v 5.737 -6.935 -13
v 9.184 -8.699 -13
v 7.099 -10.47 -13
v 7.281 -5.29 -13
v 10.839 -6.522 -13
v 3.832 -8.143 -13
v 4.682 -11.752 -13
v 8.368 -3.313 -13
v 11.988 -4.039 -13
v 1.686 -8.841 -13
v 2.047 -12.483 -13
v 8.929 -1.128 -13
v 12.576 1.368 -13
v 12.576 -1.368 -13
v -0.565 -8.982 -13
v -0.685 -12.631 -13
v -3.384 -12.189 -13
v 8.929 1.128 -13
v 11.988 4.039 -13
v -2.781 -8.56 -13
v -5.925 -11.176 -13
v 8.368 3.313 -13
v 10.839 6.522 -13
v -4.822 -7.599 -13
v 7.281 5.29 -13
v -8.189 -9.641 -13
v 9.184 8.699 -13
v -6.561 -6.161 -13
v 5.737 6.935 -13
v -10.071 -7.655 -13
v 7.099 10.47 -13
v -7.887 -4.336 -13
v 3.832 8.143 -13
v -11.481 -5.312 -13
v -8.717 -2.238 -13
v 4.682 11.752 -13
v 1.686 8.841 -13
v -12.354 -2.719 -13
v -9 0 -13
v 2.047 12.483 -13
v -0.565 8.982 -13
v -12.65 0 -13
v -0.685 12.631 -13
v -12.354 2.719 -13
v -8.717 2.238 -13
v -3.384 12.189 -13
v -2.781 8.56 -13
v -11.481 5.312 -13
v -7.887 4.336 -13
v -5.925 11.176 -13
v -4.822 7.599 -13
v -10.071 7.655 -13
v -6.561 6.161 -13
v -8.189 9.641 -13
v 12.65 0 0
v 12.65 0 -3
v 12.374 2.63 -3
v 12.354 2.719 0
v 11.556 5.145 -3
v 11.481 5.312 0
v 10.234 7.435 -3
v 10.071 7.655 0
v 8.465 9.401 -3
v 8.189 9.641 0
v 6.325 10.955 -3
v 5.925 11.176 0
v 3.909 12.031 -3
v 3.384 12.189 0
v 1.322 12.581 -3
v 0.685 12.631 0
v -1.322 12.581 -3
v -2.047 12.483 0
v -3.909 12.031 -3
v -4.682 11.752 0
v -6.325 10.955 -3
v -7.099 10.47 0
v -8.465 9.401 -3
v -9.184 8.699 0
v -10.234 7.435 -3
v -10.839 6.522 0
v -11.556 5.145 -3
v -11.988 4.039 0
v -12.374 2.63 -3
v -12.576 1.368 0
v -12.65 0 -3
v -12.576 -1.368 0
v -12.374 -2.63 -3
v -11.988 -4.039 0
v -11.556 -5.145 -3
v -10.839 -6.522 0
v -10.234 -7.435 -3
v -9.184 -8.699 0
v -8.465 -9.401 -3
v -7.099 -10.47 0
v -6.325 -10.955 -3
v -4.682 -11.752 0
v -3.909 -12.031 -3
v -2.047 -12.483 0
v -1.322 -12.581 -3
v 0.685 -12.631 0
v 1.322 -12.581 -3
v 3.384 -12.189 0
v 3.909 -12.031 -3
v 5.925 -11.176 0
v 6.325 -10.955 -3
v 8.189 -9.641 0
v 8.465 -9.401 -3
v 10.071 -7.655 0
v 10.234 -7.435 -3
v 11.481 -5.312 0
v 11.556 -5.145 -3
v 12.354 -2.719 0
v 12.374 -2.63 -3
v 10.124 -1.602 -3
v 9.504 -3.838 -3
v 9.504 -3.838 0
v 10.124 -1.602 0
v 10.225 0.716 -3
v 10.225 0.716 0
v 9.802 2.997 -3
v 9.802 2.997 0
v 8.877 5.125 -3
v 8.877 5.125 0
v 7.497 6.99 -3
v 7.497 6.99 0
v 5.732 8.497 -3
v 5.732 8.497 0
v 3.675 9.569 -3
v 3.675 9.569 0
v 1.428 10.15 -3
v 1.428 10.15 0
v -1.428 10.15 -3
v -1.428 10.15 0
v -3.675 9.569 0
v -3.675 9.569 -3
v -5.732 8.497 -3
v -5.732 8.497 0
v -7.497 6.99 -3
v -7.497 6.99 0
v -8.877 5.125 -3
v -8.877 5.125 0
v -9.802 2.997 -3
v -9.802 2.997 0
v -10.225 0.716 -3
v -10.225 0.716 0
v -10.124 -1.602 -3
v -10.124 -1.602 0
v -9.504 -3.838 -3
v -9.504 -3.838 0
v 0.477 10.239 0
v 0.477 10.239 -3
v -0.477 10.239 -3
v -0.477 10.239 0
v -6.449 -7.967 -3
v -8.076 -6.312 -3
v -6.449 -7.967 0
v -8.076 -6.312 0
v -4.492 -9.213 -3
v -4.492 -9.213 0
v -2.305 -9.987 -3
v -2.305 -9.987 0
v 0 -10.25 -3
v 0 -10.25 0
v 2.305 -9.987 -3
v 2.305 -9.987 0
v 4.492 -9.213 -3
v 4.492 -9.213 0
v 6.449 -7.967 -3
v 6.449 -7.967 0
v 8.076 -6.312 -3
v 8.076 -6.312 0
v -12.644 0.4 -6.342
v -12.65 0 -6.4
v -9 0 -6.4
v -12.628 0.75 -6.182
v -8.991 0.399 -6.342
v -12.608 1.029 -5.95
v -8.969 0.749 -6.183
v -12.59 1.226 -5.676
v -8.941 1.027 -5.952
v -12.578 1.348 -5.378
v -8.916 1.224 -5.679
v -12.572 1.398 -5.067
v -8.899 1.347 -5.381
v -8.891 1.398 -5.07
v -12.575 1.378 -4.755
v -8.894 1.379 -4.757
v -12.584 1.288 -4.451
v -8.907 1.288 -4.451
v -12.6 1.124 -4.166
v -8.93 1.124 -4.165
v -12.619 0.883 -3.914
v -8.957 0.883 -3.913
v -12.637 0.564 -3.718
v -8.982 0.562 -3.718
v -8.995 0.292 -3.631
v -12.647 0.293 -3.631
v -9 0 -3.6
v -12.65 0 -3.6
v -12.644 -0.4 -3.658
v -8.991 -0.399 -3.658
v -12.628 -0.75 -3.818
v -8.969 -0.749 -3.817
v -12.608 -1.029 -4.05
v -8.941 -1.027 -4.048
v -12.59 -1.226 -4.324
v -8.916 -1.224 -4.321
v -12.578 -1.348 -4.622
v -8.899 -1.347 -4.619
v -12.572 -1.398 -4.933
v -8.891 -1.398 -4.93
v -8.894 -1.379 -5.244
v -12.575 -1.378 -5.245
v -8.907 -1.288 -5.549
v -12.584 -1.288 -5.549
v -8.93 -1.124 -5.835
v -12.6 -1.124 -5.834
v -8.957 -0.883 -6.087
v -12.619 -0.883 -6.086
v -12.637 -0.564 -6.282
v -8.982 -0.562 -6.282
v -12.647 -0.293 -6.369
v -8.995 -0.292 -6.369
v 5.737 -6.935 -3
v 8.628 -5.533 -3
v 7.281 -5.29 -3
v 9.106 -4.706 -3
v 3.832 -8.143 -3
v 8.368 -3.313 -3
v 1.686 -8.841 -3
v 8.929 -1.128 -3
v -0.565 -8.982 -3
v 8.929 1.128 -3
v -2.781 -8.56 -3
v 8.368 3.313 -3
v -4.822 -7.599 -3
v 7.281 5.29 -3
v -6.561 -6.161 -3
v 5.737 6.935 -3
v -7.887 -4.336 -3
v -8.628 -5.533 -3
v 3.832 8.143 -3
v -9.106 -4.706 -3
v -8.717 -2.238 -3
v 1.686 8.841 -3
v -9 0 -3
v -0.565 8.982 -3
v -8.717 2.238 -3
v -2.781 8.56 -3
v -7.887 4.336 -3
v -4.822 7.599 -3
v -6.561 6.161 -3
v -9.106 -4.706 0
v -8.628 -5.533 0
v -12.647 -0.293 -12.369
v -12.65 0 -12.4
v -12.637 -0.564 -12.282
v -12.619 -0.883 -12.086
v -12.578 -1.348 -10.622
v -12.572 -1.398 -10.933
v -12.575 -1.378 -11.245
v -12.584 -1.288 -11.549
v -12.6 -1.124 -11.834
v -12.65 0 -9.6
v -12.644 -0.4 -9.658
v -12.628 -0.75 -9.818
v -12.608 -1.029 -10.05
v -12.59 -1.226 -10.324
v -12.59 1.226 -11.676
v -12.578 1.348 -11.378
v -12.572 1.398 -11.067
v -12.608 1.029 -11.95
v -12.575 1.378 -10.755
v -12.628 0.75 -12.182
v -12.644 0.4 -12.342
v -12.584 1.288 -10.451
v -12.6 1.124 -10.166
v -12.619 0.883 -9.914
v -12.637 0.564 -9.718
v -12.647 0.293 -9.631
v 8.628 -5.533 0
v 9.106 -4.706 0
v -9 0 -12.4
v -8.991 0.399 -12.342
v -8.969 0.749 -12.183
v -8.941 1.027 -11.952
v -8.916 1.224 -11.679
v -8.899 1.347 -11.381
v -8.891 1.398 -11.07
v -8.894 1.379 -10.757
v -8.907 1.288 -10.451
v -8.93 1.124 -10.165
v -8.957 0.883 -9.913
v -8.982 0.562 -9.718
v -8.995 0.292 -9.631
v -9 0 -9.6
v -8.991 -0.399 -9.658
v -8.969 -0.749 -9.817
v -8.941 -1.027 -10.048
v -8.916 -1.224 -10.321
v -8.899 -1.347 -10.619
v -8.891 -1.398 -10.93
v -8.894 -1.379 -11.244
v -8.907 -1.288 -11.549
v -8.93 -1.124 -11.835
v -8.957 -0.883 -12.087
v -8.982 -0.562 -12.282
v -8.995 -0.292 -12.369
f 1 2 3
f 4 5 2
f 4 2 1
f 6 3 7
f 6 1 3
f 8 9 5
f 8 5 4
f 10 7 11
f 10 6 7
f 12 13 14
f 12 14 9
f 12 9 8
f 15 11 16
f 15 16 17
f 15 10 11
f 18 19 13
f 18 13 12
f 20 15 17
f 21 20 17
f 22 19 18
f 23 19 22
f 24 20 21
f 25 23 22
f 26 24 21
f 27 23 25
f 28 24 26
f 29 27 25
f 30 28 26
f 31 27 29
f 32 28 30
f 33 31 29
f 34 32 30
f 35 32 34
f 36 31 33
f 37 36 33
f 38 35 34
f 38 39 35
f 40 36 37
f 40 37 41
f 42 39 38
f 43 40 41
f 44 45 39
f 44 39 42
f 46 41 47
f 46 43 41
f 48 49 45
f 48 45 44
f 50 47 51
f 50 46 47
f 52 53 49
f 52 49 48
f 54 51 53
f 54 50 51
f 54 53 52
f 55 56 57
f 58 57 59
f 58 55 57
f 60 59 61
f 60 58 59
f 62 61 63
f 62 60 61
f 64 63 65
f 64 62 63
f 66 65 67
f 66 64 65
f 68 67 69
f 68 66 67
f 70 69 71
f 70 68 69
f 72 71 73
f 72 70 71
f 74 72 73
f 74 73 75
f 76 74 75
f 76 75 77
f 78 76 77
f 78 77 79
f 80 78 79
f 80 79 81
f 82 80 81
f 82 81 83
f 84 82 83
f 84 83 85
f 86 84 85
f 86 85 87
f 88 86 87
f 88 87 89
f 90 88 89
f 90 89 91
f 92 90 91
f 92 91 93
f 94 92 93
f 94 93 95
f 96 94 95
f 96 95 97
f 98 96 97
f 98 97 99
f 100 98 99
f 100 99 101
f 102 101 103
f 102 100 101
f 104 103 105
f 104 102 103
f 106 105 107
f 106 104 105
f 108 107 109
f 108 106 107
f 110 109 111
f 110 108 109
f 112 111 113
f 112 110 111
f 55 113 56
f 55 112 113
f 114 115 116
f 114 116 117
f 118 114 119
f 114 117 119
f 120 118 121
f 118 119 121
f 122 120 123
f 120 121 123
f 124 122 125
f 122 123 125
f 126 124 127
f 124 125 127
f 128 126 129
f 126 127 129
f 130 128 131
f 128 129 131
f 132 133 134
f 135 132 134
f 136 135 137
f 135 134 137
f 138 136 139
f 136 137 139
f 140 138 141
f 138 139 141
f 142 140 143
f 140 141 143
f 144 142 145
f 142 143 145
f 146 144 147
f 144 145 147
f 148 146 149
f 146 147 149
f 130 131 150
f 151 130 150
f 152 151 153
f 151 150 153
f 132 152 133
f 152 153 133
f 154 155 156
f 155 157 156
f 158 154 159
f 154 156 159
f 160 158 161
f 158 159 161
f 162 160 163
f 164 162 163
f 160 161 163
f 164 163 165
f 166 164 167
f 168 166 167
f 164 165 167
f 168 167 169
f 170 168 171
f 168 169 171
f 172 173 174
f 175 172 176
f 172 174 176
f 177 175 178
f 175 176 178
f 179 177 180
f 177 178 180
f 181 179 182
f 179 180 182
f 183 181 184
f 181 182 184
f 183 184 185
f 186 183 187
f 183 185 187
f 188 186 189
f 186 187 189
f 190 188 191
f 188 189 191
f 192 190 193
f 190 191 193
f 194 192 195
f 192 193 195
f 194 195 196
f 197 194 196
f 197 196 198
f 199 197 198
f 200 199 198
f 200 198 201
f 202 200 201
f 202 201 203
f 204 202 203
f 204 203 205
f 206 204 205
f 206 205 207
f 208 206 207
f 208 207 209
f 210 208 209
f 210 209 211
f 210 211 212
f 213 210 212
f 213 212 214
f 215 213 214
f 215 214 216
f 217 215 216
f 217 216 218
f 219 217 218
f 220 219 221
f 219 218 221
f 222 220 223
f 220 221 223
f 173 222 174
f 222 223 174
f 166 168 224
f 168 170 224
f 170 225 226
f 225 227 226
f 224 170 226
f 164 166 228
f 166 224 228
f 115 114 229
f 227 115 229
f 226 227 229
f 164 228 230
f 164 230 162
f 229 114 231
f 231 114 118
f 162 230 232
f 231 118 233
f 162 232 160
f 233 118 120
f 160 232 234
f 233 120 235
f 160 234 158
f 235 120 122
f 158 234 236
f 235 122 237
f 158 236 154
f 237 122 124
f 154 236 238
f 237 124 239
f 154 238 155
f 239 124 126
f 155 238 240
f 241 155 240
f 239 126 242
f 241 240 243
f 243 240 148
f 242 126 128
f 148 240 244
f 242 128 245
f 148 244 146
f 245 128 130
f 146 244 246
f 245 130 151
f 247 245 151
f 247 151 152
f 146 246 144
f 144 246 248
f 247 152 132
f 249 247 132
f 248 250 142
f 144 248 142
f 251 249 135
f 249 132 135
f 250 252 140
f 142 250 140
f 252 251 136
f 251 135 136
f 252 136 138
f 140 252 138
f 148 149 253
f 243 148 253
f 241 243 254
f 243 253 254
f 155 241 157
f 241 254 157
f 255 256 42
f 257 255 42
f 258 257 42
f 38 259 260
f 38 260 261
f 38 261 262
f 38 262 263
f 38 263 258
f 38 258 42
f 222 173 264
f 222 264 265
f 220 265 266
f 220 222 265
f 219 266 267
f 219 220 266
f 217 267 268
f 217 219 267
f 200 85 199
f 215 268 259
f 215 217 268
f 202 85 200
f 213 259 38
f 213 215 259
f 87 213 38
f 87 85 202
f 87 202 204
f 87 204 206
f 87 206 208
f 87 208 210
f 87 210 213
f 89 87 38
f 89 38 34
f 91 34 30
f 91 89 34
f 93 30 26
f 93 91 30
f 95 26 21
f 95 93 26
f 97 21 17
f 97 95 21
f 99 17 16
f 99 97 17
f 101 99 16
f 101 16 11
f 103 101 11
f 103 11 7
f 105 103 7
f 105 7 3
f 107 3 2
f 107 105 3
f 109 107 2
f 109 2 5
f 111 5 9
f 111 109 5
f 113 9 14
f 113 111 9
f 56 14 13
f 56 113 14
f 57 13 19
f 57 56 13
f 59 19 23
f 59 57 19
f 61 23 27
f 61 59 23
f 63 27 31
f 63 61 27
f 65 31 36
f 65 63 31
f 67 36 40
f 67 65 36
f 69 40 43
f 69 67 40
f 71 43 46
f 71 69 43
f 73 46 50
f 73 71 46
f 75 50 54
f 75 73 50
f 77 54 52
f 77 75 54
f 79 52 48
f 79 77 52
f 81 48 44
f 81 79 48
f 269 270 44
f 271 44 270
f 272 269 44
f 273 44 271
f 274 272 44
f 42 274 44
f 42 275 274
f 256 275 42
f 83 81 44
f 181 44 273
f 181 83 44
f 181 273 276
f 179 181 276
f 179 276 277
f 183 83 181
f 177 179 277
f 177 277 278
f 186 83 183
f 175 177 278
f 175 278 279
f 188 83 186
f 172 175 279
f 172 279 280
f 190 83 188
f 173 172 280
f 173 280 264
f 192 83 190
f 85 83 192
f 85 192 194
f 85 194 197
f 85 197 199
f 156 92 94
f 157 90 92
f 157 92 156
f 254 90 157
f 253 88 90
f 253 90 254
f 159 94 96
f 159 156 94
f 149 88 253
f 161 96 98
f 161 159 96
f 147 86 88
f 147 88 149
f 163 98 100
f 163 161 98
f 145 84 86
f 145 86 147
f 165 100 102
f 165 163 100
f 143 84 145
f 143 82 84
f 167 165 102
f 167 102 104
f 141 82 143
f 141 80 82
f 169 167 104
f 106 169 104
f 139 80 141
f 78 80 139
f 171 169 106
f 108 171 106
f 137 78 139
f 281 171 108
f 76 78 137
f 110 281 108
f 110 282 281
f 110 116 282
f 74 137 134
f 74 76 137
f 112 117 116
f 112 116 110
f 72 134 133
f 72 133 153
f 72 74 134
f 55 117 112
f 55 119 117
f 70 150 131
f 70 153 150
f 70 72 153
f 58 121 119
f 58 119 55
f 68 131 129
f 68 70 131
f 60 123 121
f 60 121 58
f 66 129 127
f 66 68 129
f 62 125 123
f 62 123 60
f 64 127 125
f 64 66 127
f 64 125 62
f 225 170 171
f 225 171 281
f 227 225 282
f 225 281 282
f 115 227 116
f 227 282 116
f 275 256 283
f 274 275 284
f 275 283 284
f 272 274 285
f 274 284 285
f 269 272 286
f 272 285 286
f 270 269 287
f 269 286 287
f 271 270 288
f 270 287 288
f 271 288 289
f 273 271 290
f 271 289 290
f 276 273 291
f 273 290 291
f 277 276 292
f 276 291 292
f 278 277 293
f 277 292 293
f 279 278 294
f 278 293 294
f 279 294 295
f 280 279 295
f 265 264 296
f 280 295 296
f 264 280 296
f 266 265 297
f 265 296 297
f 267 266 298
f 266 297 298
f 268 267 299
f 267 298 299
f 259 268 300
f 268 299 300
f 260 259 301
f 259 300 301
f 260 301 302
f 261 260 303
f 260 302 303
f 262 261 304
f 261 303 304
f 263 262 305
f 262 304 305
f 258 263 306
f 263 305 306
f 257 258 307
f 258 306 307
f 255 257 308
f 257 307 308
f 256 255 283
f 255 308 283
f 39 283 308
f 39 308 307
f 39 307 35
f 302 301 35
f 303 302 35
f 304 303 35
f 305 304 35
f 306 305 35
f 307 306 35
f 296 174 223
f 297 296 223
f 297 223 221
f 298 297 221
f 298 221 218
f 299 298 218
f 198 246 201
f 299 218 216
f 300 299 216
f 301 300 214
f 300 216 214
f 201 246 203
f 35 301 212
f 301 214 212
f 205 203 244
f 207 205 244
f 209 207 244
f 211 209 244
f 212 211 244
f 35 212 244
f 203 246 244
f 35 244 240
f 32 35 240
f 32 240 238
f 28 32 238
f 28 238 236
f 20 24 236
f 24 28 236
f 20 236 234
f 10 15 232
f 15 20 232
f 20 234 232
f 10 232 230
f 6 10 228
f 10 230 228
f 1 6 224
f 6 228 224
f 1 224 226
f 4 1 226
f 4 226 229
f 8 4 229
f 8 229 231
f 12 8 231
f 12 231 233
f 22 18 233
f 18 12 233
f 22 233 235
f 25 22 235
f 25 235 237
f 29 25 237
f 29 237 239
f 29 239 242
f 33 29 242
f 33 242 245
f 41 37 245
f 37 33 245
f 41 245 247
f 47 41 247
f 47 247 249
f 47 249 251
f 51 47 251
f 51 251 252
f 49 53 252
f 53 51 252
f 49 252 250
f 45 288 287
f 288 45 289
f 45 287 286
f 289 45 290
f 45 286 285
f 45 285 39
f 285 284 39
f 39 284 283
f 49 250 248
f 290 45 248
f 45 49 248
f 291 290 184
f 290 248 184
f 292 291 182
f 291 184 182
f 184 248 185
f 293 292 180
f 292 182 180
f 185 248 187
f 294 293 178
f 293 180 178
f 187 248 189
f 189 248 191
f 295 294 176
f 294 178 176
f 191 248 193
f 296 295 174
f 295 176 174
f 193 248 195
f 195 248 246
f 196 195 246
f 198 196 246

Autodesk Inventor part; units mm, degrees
ref_plane "YZ Plane" through (0, 0, 0) normal (1, 0, 0) x (0, 1, 0)
ref_plane "XZ Plane" through (0, 0, 0) normal (0, 1, 0) x (-1, 0, 0)
ref_plane "XY Plane" through (0, 0, 0) normal (0, 0, 1) x (1, 0, 0)
sketch "Sketch1" plane through (0, 0, 0) normal (0, 0, 1) x (1, 0, 0)
  line L0 (9.6801, -14.008) -> (7.2052, -11.5331) construction
  line L1 (7.2052, -11.5331) -> (11.5893, -7.1491) construction
  line L2 (11.5893, -7.1491) -> (14.0642, -9.6239) construction
  line L3 (14.0642, -9.6239) -> (9.6801, -14.008) construction
  arc A0 (12.6369, -4.7496) -> (4.7496, -12.6369) centre (0, 0) ccw construction
  line L4 (10.9298, -3.0424) -> (12.6369, -4.7496) construction
  line L5 (11.6618, -4.6122) -> (10.9298, -3.0424) construction
  arc A1 (11.6618, -4.6122) -> (10.8551, -4.47) centre (11.2086, -4.8235) ccw construction
  line L6 (10.7915, -4.5335) -> (10.8551, -4.47) construction
  arc A2 (10.7915, -4.5335) -> (10.6527, -4.9738) centre (11.1451, -4.887) ccw construction
  line L7 (10.915, -6.4612) -> (10.6527, -4.9738) construction
  arc A3 (10.7761, -6.9016) -> (10.915, -6.4612) centre (10.4226, -6.548) ccw construction
  line L8 (6.9016, -10.7761) -> (10.7761, -6.9016) construction
  arc A4 (6.4612, -10.915) -> (6.9016, -10.7761) centre (6.548, -10.4226) ccw construction
  line L9 (6.4612, -10.915) -> (4.9738, -10.6527) construction
  arc A5 (4.9738, -10.6527) -> (4.5335, -10.7915) centre (4.887, -11.1451) ccw construction
  line L10 (4.5335, -10.7915) -> (4.47, -10.8551) construction
  arc A6 (4.47, -10.8551) -> (4.6122, -11.6618) centre (4.8235, -11.2086) ccw construction
  line L11 (4.6122, -11.6618) -> (3.0424, -10.9298) construction
  line L12 (3.0424, -10.9298) -> (4.7496, -12.6369) construction
  line L13 (-1.7167, -14.6498) -> (-1.7167, -17.5) construction
  line L14 (-1.7167, -17.5) -> (1.7167, -17.5) construction
  line L15 (1.7167, -14.6498) -> (1.7167, -17.5) construction
  arc A7 (1.7167, -14.6498) -> (6.9595, -13.0049) centre (0, 0) ccw construction
  arc A8 (6.9595, -13.0049) -> (8.2728, -15.1789) centre (8.2994, -13.6792) ccw construction
  line L16 (8.2728, -15.1789) -> (7.6816, -15.1684) construction
  arc A9 (8.5249, -17.8901) -> (7.6816, -15.1684) centre (7.655, -16.6682) ccw construction
  line L17 (8.5249, -17.8901) -> (13.5161, -14.3366) construction
  line L18 (13.5161, -14.3366) -> (13.5161, -12.2823) construction
  line L19 (13.5161, -12.2823) -> (14.6168, -12.2823) construction
  line L20 (14.6168, -12.2823) -> (14.6168, -1.9776) construction
  arc A10 (14.6168, -1.9776) -> (1.7167, 14.6498) centre (0, 0) ccw construction
  line L21 (1.7167, 14.6498) -> (1.7167, 17.5) construction
  line L22 (-1.7167, 17.5) -> (1.7167, 17.5) construction
  line L23 (-1.7167, 14.6498) -> (-1.7167, 17.5) construction
  arc A11 (-1.7167, 14.6498) -> (-14.2817, -3.6872) centre (0, 0) ccw construction
  line L24 (-14.2817, -3.6872) -> (-15.4135, -5.7935) construction
  arc A12 (-15.4135, -5.7935) -> (-14.5984, -8.502) centre (-13.6517, -6.7402) ccw construction
  line L25 (-14.5984, -8.502) -> (-9.6326, -11.1703) construction
  arc A13 (-9.6326, -11.1703) -> (-1.7167, -14.6498) centre (0, 0) ccw construction
  line L26 (-24.6, 24.6) -> (25.2, -25.2) construction
  line L27 (25.2, 24.6) -> (-24.6, -25.2) construction
  arc A14 (-1.4283, 10.15) -> (-9.5043, -3.8381) centre (0, 0) ccw
  circle A15 centre (0, 0) radius 10.1 construction
  line L28 (-1.4283, 10.15) -> (1.4283, 10.15)
  line L29 (-8.076, -6.3119) -> (-9.5043, -3.8381)
  line L30 (9.5043, -3.8381) -> (8.076, -6.3119)
  arc A16 (1.4283, 10.15) -> (-1.4283, 10.15) centre (0, 0) ccw
  arc A17 (9.5043, -3.8381) -> (1.4283, 10.15) centre (0, 0) ccw
  arc A18 (8.076, -6.3119) -> (9.5043, -3.8381) centre (0, 0) ccw
  arc A19 (-8.076, -6.3119) -> (8.076, -6.3119) centre (0, 0) ccw
  arc A20 (-9.5043, -3.8381) -> (-8.076, -6.3119) centre (0, 0) ccw
  arc A21 (10.7786, -4.5205) -> (10.6704, -4.6789) centre (11.1451, -4.887) ccw construction
  line L31 (10.7786, -4.5205) -> (10.8421, -4.457) construction
  arc A22 (11.7261, -4.7937) -> (10.8421, -4.457) centre (11.2086, -4.8235) ccw construction
  line L32 (11.7261, -4.7937) -> (10.8691, -2.9558) construction
  line L33 (10.8691, -2.9558) -> (12.6297, -4.7164) construction
  line L34 (4.7164, -12.6297) -> (2.9558, -10.8691) construction
  line L35 (2.9558, -10.8691) -> (4.4463, -11.5641) construction
  arc A23 (4.457, -10.8421) -> (4.4463, -11.5641) centre (4.8235, -11.2086) ccw construction
  line L36 (4.457, -10.8421) -> (4.5223, -10.7767) construction
  arc A24 (4.977, -10.6346) -> (4.6789, -10.6704) centre (4.887, -11.1451) ccw
  arc A25 (4.6789, -10.6704) -> (4.5223, -10.7767) centre (4.887, -11.1451) ccw construction
  arc A26 (10.6704, -4.6789) -> (10.6346, -4.977) centre (11.1451, -4.887) ccw
  circle A27 centre (0, 0) radius 12.65
  dimension "d4" = 20.2
  dimension "d5" = 10.15
  dimension "d6" = 20.5
  dimension "d9" = 360
  dimension "d28" = 25.3
extrude "Extrusion1" add sketch "Sketch1" against normal blind 3
sketch "Sketch3" plane through (0, 0, -3) normal (0, 0, -1) x (-1, 0, 0)
  circle A0 centre (0, 0) radius 10.25 projected
  circle A1 centre (0, 0) radius 9
  circle A2 centre (0, 0) radius 11.5312
  circle A3 centre (0, 0) radius 12.65 projected
  dimension "d17" = 18
extrude "Extrusion3" add sketch "Sketch3" along normal blind 10 contours A0 | A2 | A3
sketch "Sketch4" plane through (0, -10.7054, 0) normal (1, 0, 0) x (0, 0, -1)
  line L0 (13, 19.7054) -> (13, 1.7054) projected
  line L1 (3, 1.7054) -> (3, 19.7054) projected
  circle A0 centre (11, 10.7054) radius 1.4
  circle A1 centre (5, 10.7054) radius 1.4
  dimension "d24" = 2.8
  dimension "d25" = 2.8
  dimension "d26" = 6
  dimension "d27" = 2
extrude "Extrusion4" cut sketch "Sketch4" against normal through all
properties part number "30_focus_inlet_objective_mount_v7"
